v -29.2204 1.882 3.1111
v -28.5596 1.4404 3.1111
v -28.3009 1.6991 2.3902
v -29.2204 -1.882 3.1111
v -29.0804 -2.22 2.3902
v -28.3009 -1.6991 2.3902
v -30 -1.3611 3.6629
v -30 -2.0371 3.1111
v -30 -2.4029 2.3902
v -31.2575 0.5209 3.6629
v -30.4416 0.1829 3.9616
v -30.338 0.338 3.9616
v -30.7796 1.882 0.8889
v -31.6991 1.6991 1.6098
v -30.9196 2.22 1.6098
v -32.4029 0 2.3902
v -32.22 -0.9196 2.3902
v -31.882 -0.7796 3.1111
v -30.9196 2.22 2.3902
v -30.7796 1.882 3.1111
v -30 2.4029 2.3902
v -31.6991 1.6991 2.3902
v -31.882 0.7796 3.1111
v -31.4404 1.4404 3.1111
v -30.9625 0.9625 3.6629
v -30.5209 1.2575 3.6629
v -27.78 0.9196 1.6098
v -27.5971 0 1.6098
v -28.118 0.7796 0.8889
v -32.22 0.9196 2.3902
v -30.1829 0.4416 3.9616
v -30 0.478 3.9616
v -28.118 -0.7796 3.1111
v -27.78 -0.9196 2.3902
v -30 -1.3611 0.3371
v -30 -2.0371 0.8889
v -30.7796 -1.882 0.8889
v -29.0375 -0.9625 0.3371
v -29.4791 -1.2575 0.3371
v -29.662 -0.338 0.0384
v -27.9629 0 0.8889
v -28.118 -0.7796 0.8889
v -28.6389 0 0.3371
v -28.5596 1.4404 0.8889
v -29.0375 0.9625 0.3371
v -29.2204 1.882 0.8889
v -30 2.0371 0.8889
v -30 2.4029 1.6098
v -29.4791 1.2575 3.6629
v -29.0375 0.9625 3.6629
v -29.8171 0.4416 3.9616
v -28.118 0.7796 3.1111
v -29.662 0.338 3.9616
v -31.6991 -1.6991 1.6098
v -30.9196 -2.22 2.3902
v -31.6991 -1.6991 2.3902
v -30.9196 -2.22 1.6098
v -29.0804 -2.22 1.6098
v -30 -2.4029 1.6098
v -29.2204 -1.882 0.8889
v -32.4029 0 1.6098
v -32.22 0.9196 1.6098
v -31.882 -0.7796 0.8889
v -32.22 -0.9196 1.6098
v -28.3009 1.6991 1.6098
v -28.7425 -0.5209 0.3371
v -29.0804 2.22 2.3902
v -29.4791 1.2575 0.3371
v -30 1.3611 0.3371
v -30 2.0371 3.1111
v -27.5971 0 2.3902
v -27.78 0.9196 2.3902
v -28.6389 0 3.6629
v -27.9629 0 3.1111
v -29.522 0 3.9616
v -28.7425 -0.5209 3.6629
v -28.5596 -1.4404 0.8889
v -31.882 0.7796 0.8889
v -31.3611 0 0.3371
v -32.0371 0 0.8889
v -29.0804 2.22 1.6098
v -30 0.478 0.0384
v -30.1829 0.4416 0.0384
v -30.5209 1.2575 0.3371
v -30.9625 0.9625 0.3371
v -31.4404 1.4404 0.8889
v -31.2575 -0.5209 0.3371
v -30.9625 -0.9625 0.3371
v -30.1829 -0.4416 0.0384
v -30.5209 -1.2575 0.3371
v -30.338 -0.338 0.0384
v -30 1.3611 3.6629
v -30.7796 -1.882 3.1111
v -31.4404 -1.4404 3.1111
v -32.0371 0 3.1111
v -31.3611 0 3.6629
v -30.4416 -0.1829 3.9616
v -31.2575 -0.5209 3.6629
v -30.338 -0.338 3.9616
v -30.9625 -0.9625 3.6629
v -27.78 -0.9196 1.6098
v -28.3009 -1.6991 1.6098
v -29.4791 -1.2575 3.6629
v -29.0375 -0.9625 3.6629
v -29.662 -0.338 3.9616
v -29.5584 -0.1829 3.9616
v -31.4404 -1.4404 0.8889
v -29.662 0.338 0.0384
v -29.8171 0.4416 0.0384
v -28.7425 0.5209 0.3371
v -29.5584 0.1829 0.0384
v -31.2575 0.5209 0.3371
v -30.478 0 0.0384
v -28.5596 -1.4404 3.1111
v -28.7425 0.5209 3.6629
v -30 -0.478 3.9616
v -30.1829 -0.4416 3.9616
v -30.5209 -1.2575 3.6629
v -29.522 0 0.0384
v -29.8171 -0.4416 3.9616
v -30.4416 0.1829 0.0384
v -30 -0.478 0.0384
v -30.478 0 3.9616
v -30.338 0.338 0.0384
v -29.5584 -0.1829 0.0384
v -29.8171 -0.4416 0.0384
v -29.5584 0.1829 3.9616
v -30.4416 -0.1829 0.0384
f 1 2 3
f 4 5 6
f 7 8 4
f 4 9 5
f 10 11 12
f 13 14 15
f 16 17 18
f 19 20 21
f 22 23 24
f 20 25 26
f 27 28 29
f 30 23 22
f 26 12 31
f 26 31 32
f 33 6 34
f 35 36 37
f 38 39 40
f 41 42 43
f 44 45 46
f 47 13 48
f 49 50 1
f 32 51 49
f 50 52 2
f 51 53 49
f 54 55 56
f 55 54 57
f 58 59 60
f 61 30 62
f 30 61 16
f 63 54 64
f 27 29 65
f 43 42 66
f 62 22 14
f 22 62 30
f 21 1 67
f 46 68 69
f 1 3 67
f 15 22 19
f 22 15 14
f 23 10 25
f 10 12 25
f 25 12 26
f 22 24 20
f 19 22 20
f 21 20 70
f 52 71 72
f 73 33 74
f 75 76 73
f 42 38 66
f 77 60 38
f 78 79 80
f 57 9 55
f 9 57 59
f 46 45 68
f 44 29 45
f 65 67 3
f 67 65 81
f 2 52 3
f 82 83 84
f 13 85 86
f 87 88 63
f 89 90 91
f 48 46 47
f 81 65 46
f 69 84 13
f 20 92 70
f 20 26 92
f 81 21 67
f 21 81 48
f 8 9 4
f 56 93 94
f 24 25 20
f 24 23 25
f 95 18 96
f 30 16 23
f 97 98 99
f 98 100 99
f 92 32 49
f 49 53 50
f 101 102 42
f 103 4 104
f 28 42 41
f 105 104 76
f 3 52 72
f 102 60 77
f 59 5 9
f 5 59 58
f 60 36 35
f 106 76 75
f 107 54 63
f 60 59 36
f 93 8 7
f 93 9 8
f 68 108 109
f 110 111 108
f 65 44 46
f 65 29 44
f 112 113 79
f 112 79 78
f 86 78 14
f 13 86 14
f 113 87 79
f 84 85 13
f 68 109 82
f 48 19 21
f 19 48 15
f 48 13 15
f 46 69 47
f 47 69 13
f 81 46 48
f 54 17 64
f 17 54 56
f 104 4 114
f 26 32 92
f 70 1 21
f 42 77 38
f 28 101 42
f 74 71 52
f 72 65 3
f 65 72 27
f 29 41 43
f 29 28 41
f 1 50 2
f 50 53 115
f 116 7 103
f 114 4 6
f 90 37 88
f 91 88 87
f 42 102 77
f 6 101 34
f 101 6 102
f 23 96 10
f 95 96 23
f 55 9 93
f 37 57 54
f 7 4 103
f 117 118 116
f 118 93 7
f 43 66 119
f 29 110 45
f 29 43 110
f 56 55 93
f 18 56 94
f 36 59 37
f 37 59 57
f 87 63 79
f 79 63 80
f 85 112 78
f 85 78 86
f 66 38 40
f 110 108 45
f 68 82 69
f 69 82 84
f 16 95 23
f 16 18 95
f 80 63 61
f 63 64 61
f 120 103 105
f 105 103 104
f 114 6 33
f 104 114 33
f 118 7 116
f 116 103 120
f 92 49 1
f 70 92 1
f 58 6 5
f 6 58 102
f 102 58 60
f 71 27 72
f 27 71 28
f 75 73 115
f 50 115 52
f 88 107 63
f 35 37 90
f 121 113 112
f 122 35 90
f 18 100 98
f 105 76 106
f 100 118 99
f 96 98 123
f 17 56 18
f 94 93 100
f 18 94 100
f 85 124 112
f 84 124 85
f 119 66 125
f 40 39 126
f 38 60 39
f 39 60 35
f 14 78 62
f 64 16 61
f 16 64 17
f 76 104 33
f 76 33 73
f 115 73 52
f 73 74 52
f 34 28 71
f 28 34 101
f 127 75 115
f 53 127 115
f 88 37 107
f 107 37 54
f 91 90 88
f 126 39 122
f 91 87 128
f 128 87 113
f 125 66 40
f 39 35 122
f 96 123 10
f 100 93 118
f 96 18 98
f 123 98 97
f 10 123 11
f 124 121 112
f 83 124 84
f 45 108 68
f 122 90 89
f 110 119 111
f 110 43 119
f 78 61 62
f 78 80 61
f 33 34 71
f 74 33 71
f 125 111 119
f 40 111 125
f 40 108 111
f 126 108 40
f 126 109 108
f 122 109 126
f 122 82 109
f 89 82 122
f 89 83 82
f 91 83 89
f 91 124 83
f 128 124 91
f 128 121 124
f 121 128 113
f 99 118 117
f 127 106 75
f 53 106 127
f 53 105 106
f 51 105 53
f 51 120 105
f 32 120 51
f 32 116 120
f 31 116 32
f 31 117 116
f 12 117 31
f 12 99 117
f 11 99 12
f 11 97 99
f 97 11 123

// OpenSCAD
doBatteryPart = true;
doLedPart = true;
doLedCutout = true;
doVersionNr = false;


rotZ = 90;

dxfFileName = "MS3000_case_V220.dxf";
topH=1.2;


glassH = 0.6;
bottomH=2;

logoH = 0.5;



buttonPos = [ 40, 50, 60];
buttonR = 5;
buttonH = 6;

cutoutH = bottomH - glassH; // 1.6;
pcbClearance = 0.45;
pcbH=1.6;
buttonH = 4;

usbH = 0;

ledPartH = 6.9;
batteryPartH= 3.7;
snapInH = 1;
snapInW = 0.8;
delta = 0.40;
//holeH=2;

pillarR=1+1.92;

$fn = 24;
//$fn=8;

infSize = 400;


// -0.1 so we dont press onto the board too much
pillarH= ledPartH + batteryPartH - (bottomH + pcbH - snapInH) - 0.1;
wallOffset = pcbClearance+2*snapInW+delta;

pcbHeight = 24.2;

cylYOffset = pcbHeight/2;
cylPositions = [
  [18.0825, 22.6 - cylYOffset],
 [16.8275, 1.6 - cylYOffset],
 [97.8, 22.6 - cylYOffset],
 [97.8, 1.6 - cylYOffset],
];

cCS = 10;
cOO = 1;
cDD = 1.7;
cylCutawayParams = [
 [[1, [0, 0, 0], [0, -(cCS/2+cOO), cCS/2-cDD]]
 //, [1, [0, 0, 0], [6, 3-(cCS/2+cOO), cCS/2-cDD-6]]
 ],
 [[1, [0, 0, 0],  [0, cCS/2+cOO, cCS/2-cDD]]],
 [[0]],
 [[1, [0, 0, 0], , [0, cCS/2+cOO, cCS/2-cDD]]],
];
smallButtonPositions = [
    [32.7025, 21.14],
    [3.06, 5.08],
];

bbY = 17.3;
bbZ = 6.3;
bbR = 6.0;    
bbRX = 8;
buttonPositions = [
    [39.65, bbY, bbZ],
    [49.65, bbY, bbZ],
    [59.65, bbY, bbZ],
];


rotate([0,0,rotZ]) {
    if (doBatteryPart) 
        translate([0,0, topH]) 
            mirror([0, -1, 0])
                BatteryPart();
    
    if (doLedPart)
        translate([0, doBatteryPart ? 30 : 0, 0])
            LedPart();
}

expl= 0.1;

*intersection() {
rotate([0,0,0]) {
    translate([0,0, bottomH+expl]) 
        linear_extrude(convexity = 10, height = pcbH-expl, center = false)
            import(file = dxfFileName, layer = "pcb", convexity = 10, scale=1);

    
    if (doBatteryPart) 
        translate([0,0, ledPartH + batteryPartH + snapInH + expl]) 
            rotate([180,0,0])
            mirror([0, -1, 0])
                BatteryPart();
    
    if (doLedPart)
        translate([0, 0, 0])
            LedPart();
}
cubeEx([35.5, 100, 100]);
}

module BatteryPart() {
difference() {
union() {
    #intersection() {
     translate([0,0,0]) {
                for (pos = cylPositions) {
			translate([pos[0], pos[1], -1]) {
                cylinder(r=pillarR, h=pillarH+1, center=false);
				cylinder(r1= 8, r2= 0, h = 8, center=false);
			}
		}
      }
      union() {
        translate([0,0,4]) linear_extrude(convexity = 10, height = infSize, center = true)
                //minkowski() {
                import(file = dxfFileName, layer = "pcb", convexity = 10, scale=1);
                //    circle(r=pcbClearance-delta);
                //};
      
           translate([0,0,-infSize/2+batteryPartH]) linear_extrude(convexity = 10, height = infSize, center = true)
                minkowski() {
                import(file = dxfFileName, layer = "pcb", convexity = 10, scale=1);
                    circle(r=1);
                };
      
    }
}

intersection() {
    // pcb um null darauf waende in xyz
    difference()
    {
       minkowski() {
        linear_extrude(convexity = 10, height = batteryPartH, center = false)
                import(file = dxfFileName, layer = "pcb", convexity = 10, scale=1);
        ellipsoid([wallOffset,wallOffset, topH]);
        }
    
    difference() {
        // cutout
        translate([0,0,0]) linear_extrude(convexity = 10, height = infSize, center = false)
                minkowski() {
                    import(file = dxfFileName, layer = "pcb", convexity = 10, scale=1);
                     circle(r=pcbClearance, $fn=16);
                }
        }
        cubeEx([infSize, infSize, infSize], [0, 0, 0.5], [0,0, batteryPartH]);
    }
    
    
     // snapIn
    union() 
    {
      linear_extrude(convexity = 10, height = (batteryPartH-snapInH)*2, center = true)
			minkowski() {
                import(file = dxfFileName, layer = "pcb", convexity = 10, scale=1);
                 circle(r=wallOffset+1, $fn=16);
            };
            
            linear_extrude(convexity = 10, height = (batteryPartH+snapInH)*2, center = true)
                minkowski() {
                    import(file = dxfFileName, layer = "pcb", convexity = 10, scale=1);
                     circle(r=pcbClearance+snapInW, $fn=16);
                }
      }
}
}

     // screwholes and versenkte schraubenkoepfe ;)
		translate([0, 0, -1]) for (pos = cylPositions) {
			translate([pos[0], pos[1], -1]) {
				cylinder(r= 1.50, h = 50, center=true);
				#cylinder(r1= 4.3, r2= 0, h = 4.3, center=false);
			}
		}
        
       # translate([0, 0, 0]) for (pIdx = [0, 1, 2, 3]) {
            paramss = cylCutawayParams[pIdx];
         echo(paramss);
            //params=paramss[0];
        for (params = paramss)
            if (params[0]) {
                pos = cylPositions[pIdx];
                rp = params[1];
                tr = params[2];
                 translate(tr) translate([pos[0], pos[1], pillarH]) rotate(rp) {
                    cubeEx([cCS, cCS, cCS]);
                }
            }
		}
            
                

      #translate([0,0,-topH]) LogoCutout(doLogo = true, doVNr = doVersionNr);
   
     
     // aux HOLES (reset, power off)B
     union() {
     
     for (pos = smallButtonPositions) {
			translate([pos[0], pos[1]-cylYOffset]) {
				cylinder(r= 1.3, h = 4*infSize, center=true);
			}
		}
    }

 *for (pos = buttonPositions) {
			translate([pos[0], pos[1], 10 - pos[2]])
                ellipsoid([bbRX,bbR,bbR]);      
     } 
     
     translate([0,0,10-2*buttonPositions[0][2]]) ButtonCutout();
}}

module LogoCutout(doLogo, doVNr) {
    
      translate([0,0,0]) {
         linear_extrude(convexity = 10, height = 2*logoH, center = true ) {
                if (doLogo) {
                    import(file = dxfFileName, layer = "logo_magic", convexity = 10, scale=1);
                    import(file = dxfFileName, layer = "logo_shifter", convexity = 10, scale=1);
                }
                if (doVNr) {
                    import(file = dxfFileName, layer = "VersionText", convexity = 10, scale=1);
                    *translate([77, -6  , 0]) circle(r = 1);
                }
            }
        }
    
}

module ButtonCutout() {
     for (pos = buttonPositions) {
        translate(pos) ellipsoid([bbRX,bbR,bbR],$fn=64);      
     }
 }


// led part
module LedPart() {
    difference() {
translate([0, 0, bottomH]) difference()
{
    // pcb um null in bottomH und dann in xyz fuer outher walls
    minkowski() {
        linear_extrude(convexity = 10, height = ledPartH, center = false)
                import(file = dxfFileName, layer = "pcb", convexity = 10, scale=1);
        ellipsoid([wallOffset,wallOffset, bottomH]);
    }
    
    // pcp plus clearance
    translate([0,0,0]) linear_extrude(convexity = 10, height = infSize, center = false)
			minkowski() {
                import(file = dxfFileName, layer = "pcb", convexity = 10, scale=1);
                 circle(r=pcbClearance, $fn=16);
            };

    if (doLedCutout) {
        // ledspace raus
        translate([0,0, glassH-bottomH]) linear_extrude(convexity = 10, height = infSize, center = false)
        
        minkowski() {
                import(file = dxfFileName, layer = "leds", convexity = 10, scale=1);
                    circle(r=1);
                };
    }
            
    // ledspace raus
    translate([0,0, doLedCutout ? -5 : glassH-bottomH]) linear_extrude(convexity = 10, height = infSize, center = false)
			import(file = dxfFileName, layer = "leds", convexity = 10, scale=1);
            
    // space for through hol components
    translate([0,0,-cutoutH])
    linear_extrude(convexity = 10, height = infSize, center = false)
			import(file = dxfFileName, layer = "cutout_solder", convexity = 10, scale=1);
            
     
    ButtonCutout();
            
 
        
     
            
            translate([-infSize/3,0, pcbH+usbH]) rotate([0,0,0]) rotate([90,00,0]) rotate([0,00,90]) rotate([90,90,0]) linear_extrude(convexity = 10, height = infSize, center = true)
			import(file = dxfFileName, layer = "usb", convexity = 10, scale=1);
      
       
   // occams razor ;)    
      cubeEx([infSize, infSize, infSize], [0, 0, 0.5], [0,0, ledPartH]);
         
            
      // snapIn
      translate([0,0,ledPartH-snapInH]) linear_extrude(convexity = 10, height = infSize, center = false)
			minkowski() {
                import(file = dxfFileName, layer = "pcb", convexity = 10, scale=1);
                 circle(r=wallOffset-snapInW, $fn=16);
            }
            
       #for (pos = cylPositions) {
			translate([pos[0], pos[1], -bottomH-0.1]) {
				cylinder(r1= 0.60, r2=1.00, h = bottomH+2*0.1, center=false);
			}
		}
           
            
            
            
}

//#translate([2,16,0]) 
#mirror([0,1,0]) 
#LogoCutout(doLogo = false, doVNr = doVersionNr);

}
}








// my improved version of the openSCAD cube module
// size works like the first parameter of the cube primitive, it's a 3 dim vector that contains the sidelengths of the "cube" ;)
// center is also a 3 dim vector so you can specify the centering for each axis individually, This is normaly either -0.5, 0 (equal to center = true), or 0.5 (equal to center = false) but any value is possible.
// offset specifies an absolute offset in mm from the position that would result from just the center parameter
module cubeEx(size=[1,1,1], center=[0,0,0], offset=[0,0,0], childCenters, childOffsets, unionNotDifference=0)
{
	//s = 1.5;
	//centerExp = [s*center[0], s*center[1], s*center[2]];

	translate([center[0]*size[0]+offset[0], center[1]*size[1]+offset[1], center[2]*size[2]+offset[2]])
	{
		if (!unionNotDifference)
			difference()
			{
				cube(size, center = true);
				if ($children > 0) for (i = [0:$children-1])
					translate([childCenters[i][0]*size[0]+childOffsets[i][0], childCenters[i][1]*size[1]+childOffsets[i][1], childCenters[i][2]*size[2]+childOffsets[i][2]]) child(i);
			}
		if (unionNotDifference)
			union()
			{
				cube(size, center = true);
				if ($children > 0) for (i = [0:$children-1])
					translate([childCenters[i][0]*size[0]+childOffsets[i][0], childCenters[i][1]*size[1]+childOffsets[i][1], childCenters[i][2]*size[2]+childOffsets[i][2]]) child(i);
			}
	}
}


module ellipsoid(v)
{
    scale(v, $fn=16) sphere(r=1);
}


    
